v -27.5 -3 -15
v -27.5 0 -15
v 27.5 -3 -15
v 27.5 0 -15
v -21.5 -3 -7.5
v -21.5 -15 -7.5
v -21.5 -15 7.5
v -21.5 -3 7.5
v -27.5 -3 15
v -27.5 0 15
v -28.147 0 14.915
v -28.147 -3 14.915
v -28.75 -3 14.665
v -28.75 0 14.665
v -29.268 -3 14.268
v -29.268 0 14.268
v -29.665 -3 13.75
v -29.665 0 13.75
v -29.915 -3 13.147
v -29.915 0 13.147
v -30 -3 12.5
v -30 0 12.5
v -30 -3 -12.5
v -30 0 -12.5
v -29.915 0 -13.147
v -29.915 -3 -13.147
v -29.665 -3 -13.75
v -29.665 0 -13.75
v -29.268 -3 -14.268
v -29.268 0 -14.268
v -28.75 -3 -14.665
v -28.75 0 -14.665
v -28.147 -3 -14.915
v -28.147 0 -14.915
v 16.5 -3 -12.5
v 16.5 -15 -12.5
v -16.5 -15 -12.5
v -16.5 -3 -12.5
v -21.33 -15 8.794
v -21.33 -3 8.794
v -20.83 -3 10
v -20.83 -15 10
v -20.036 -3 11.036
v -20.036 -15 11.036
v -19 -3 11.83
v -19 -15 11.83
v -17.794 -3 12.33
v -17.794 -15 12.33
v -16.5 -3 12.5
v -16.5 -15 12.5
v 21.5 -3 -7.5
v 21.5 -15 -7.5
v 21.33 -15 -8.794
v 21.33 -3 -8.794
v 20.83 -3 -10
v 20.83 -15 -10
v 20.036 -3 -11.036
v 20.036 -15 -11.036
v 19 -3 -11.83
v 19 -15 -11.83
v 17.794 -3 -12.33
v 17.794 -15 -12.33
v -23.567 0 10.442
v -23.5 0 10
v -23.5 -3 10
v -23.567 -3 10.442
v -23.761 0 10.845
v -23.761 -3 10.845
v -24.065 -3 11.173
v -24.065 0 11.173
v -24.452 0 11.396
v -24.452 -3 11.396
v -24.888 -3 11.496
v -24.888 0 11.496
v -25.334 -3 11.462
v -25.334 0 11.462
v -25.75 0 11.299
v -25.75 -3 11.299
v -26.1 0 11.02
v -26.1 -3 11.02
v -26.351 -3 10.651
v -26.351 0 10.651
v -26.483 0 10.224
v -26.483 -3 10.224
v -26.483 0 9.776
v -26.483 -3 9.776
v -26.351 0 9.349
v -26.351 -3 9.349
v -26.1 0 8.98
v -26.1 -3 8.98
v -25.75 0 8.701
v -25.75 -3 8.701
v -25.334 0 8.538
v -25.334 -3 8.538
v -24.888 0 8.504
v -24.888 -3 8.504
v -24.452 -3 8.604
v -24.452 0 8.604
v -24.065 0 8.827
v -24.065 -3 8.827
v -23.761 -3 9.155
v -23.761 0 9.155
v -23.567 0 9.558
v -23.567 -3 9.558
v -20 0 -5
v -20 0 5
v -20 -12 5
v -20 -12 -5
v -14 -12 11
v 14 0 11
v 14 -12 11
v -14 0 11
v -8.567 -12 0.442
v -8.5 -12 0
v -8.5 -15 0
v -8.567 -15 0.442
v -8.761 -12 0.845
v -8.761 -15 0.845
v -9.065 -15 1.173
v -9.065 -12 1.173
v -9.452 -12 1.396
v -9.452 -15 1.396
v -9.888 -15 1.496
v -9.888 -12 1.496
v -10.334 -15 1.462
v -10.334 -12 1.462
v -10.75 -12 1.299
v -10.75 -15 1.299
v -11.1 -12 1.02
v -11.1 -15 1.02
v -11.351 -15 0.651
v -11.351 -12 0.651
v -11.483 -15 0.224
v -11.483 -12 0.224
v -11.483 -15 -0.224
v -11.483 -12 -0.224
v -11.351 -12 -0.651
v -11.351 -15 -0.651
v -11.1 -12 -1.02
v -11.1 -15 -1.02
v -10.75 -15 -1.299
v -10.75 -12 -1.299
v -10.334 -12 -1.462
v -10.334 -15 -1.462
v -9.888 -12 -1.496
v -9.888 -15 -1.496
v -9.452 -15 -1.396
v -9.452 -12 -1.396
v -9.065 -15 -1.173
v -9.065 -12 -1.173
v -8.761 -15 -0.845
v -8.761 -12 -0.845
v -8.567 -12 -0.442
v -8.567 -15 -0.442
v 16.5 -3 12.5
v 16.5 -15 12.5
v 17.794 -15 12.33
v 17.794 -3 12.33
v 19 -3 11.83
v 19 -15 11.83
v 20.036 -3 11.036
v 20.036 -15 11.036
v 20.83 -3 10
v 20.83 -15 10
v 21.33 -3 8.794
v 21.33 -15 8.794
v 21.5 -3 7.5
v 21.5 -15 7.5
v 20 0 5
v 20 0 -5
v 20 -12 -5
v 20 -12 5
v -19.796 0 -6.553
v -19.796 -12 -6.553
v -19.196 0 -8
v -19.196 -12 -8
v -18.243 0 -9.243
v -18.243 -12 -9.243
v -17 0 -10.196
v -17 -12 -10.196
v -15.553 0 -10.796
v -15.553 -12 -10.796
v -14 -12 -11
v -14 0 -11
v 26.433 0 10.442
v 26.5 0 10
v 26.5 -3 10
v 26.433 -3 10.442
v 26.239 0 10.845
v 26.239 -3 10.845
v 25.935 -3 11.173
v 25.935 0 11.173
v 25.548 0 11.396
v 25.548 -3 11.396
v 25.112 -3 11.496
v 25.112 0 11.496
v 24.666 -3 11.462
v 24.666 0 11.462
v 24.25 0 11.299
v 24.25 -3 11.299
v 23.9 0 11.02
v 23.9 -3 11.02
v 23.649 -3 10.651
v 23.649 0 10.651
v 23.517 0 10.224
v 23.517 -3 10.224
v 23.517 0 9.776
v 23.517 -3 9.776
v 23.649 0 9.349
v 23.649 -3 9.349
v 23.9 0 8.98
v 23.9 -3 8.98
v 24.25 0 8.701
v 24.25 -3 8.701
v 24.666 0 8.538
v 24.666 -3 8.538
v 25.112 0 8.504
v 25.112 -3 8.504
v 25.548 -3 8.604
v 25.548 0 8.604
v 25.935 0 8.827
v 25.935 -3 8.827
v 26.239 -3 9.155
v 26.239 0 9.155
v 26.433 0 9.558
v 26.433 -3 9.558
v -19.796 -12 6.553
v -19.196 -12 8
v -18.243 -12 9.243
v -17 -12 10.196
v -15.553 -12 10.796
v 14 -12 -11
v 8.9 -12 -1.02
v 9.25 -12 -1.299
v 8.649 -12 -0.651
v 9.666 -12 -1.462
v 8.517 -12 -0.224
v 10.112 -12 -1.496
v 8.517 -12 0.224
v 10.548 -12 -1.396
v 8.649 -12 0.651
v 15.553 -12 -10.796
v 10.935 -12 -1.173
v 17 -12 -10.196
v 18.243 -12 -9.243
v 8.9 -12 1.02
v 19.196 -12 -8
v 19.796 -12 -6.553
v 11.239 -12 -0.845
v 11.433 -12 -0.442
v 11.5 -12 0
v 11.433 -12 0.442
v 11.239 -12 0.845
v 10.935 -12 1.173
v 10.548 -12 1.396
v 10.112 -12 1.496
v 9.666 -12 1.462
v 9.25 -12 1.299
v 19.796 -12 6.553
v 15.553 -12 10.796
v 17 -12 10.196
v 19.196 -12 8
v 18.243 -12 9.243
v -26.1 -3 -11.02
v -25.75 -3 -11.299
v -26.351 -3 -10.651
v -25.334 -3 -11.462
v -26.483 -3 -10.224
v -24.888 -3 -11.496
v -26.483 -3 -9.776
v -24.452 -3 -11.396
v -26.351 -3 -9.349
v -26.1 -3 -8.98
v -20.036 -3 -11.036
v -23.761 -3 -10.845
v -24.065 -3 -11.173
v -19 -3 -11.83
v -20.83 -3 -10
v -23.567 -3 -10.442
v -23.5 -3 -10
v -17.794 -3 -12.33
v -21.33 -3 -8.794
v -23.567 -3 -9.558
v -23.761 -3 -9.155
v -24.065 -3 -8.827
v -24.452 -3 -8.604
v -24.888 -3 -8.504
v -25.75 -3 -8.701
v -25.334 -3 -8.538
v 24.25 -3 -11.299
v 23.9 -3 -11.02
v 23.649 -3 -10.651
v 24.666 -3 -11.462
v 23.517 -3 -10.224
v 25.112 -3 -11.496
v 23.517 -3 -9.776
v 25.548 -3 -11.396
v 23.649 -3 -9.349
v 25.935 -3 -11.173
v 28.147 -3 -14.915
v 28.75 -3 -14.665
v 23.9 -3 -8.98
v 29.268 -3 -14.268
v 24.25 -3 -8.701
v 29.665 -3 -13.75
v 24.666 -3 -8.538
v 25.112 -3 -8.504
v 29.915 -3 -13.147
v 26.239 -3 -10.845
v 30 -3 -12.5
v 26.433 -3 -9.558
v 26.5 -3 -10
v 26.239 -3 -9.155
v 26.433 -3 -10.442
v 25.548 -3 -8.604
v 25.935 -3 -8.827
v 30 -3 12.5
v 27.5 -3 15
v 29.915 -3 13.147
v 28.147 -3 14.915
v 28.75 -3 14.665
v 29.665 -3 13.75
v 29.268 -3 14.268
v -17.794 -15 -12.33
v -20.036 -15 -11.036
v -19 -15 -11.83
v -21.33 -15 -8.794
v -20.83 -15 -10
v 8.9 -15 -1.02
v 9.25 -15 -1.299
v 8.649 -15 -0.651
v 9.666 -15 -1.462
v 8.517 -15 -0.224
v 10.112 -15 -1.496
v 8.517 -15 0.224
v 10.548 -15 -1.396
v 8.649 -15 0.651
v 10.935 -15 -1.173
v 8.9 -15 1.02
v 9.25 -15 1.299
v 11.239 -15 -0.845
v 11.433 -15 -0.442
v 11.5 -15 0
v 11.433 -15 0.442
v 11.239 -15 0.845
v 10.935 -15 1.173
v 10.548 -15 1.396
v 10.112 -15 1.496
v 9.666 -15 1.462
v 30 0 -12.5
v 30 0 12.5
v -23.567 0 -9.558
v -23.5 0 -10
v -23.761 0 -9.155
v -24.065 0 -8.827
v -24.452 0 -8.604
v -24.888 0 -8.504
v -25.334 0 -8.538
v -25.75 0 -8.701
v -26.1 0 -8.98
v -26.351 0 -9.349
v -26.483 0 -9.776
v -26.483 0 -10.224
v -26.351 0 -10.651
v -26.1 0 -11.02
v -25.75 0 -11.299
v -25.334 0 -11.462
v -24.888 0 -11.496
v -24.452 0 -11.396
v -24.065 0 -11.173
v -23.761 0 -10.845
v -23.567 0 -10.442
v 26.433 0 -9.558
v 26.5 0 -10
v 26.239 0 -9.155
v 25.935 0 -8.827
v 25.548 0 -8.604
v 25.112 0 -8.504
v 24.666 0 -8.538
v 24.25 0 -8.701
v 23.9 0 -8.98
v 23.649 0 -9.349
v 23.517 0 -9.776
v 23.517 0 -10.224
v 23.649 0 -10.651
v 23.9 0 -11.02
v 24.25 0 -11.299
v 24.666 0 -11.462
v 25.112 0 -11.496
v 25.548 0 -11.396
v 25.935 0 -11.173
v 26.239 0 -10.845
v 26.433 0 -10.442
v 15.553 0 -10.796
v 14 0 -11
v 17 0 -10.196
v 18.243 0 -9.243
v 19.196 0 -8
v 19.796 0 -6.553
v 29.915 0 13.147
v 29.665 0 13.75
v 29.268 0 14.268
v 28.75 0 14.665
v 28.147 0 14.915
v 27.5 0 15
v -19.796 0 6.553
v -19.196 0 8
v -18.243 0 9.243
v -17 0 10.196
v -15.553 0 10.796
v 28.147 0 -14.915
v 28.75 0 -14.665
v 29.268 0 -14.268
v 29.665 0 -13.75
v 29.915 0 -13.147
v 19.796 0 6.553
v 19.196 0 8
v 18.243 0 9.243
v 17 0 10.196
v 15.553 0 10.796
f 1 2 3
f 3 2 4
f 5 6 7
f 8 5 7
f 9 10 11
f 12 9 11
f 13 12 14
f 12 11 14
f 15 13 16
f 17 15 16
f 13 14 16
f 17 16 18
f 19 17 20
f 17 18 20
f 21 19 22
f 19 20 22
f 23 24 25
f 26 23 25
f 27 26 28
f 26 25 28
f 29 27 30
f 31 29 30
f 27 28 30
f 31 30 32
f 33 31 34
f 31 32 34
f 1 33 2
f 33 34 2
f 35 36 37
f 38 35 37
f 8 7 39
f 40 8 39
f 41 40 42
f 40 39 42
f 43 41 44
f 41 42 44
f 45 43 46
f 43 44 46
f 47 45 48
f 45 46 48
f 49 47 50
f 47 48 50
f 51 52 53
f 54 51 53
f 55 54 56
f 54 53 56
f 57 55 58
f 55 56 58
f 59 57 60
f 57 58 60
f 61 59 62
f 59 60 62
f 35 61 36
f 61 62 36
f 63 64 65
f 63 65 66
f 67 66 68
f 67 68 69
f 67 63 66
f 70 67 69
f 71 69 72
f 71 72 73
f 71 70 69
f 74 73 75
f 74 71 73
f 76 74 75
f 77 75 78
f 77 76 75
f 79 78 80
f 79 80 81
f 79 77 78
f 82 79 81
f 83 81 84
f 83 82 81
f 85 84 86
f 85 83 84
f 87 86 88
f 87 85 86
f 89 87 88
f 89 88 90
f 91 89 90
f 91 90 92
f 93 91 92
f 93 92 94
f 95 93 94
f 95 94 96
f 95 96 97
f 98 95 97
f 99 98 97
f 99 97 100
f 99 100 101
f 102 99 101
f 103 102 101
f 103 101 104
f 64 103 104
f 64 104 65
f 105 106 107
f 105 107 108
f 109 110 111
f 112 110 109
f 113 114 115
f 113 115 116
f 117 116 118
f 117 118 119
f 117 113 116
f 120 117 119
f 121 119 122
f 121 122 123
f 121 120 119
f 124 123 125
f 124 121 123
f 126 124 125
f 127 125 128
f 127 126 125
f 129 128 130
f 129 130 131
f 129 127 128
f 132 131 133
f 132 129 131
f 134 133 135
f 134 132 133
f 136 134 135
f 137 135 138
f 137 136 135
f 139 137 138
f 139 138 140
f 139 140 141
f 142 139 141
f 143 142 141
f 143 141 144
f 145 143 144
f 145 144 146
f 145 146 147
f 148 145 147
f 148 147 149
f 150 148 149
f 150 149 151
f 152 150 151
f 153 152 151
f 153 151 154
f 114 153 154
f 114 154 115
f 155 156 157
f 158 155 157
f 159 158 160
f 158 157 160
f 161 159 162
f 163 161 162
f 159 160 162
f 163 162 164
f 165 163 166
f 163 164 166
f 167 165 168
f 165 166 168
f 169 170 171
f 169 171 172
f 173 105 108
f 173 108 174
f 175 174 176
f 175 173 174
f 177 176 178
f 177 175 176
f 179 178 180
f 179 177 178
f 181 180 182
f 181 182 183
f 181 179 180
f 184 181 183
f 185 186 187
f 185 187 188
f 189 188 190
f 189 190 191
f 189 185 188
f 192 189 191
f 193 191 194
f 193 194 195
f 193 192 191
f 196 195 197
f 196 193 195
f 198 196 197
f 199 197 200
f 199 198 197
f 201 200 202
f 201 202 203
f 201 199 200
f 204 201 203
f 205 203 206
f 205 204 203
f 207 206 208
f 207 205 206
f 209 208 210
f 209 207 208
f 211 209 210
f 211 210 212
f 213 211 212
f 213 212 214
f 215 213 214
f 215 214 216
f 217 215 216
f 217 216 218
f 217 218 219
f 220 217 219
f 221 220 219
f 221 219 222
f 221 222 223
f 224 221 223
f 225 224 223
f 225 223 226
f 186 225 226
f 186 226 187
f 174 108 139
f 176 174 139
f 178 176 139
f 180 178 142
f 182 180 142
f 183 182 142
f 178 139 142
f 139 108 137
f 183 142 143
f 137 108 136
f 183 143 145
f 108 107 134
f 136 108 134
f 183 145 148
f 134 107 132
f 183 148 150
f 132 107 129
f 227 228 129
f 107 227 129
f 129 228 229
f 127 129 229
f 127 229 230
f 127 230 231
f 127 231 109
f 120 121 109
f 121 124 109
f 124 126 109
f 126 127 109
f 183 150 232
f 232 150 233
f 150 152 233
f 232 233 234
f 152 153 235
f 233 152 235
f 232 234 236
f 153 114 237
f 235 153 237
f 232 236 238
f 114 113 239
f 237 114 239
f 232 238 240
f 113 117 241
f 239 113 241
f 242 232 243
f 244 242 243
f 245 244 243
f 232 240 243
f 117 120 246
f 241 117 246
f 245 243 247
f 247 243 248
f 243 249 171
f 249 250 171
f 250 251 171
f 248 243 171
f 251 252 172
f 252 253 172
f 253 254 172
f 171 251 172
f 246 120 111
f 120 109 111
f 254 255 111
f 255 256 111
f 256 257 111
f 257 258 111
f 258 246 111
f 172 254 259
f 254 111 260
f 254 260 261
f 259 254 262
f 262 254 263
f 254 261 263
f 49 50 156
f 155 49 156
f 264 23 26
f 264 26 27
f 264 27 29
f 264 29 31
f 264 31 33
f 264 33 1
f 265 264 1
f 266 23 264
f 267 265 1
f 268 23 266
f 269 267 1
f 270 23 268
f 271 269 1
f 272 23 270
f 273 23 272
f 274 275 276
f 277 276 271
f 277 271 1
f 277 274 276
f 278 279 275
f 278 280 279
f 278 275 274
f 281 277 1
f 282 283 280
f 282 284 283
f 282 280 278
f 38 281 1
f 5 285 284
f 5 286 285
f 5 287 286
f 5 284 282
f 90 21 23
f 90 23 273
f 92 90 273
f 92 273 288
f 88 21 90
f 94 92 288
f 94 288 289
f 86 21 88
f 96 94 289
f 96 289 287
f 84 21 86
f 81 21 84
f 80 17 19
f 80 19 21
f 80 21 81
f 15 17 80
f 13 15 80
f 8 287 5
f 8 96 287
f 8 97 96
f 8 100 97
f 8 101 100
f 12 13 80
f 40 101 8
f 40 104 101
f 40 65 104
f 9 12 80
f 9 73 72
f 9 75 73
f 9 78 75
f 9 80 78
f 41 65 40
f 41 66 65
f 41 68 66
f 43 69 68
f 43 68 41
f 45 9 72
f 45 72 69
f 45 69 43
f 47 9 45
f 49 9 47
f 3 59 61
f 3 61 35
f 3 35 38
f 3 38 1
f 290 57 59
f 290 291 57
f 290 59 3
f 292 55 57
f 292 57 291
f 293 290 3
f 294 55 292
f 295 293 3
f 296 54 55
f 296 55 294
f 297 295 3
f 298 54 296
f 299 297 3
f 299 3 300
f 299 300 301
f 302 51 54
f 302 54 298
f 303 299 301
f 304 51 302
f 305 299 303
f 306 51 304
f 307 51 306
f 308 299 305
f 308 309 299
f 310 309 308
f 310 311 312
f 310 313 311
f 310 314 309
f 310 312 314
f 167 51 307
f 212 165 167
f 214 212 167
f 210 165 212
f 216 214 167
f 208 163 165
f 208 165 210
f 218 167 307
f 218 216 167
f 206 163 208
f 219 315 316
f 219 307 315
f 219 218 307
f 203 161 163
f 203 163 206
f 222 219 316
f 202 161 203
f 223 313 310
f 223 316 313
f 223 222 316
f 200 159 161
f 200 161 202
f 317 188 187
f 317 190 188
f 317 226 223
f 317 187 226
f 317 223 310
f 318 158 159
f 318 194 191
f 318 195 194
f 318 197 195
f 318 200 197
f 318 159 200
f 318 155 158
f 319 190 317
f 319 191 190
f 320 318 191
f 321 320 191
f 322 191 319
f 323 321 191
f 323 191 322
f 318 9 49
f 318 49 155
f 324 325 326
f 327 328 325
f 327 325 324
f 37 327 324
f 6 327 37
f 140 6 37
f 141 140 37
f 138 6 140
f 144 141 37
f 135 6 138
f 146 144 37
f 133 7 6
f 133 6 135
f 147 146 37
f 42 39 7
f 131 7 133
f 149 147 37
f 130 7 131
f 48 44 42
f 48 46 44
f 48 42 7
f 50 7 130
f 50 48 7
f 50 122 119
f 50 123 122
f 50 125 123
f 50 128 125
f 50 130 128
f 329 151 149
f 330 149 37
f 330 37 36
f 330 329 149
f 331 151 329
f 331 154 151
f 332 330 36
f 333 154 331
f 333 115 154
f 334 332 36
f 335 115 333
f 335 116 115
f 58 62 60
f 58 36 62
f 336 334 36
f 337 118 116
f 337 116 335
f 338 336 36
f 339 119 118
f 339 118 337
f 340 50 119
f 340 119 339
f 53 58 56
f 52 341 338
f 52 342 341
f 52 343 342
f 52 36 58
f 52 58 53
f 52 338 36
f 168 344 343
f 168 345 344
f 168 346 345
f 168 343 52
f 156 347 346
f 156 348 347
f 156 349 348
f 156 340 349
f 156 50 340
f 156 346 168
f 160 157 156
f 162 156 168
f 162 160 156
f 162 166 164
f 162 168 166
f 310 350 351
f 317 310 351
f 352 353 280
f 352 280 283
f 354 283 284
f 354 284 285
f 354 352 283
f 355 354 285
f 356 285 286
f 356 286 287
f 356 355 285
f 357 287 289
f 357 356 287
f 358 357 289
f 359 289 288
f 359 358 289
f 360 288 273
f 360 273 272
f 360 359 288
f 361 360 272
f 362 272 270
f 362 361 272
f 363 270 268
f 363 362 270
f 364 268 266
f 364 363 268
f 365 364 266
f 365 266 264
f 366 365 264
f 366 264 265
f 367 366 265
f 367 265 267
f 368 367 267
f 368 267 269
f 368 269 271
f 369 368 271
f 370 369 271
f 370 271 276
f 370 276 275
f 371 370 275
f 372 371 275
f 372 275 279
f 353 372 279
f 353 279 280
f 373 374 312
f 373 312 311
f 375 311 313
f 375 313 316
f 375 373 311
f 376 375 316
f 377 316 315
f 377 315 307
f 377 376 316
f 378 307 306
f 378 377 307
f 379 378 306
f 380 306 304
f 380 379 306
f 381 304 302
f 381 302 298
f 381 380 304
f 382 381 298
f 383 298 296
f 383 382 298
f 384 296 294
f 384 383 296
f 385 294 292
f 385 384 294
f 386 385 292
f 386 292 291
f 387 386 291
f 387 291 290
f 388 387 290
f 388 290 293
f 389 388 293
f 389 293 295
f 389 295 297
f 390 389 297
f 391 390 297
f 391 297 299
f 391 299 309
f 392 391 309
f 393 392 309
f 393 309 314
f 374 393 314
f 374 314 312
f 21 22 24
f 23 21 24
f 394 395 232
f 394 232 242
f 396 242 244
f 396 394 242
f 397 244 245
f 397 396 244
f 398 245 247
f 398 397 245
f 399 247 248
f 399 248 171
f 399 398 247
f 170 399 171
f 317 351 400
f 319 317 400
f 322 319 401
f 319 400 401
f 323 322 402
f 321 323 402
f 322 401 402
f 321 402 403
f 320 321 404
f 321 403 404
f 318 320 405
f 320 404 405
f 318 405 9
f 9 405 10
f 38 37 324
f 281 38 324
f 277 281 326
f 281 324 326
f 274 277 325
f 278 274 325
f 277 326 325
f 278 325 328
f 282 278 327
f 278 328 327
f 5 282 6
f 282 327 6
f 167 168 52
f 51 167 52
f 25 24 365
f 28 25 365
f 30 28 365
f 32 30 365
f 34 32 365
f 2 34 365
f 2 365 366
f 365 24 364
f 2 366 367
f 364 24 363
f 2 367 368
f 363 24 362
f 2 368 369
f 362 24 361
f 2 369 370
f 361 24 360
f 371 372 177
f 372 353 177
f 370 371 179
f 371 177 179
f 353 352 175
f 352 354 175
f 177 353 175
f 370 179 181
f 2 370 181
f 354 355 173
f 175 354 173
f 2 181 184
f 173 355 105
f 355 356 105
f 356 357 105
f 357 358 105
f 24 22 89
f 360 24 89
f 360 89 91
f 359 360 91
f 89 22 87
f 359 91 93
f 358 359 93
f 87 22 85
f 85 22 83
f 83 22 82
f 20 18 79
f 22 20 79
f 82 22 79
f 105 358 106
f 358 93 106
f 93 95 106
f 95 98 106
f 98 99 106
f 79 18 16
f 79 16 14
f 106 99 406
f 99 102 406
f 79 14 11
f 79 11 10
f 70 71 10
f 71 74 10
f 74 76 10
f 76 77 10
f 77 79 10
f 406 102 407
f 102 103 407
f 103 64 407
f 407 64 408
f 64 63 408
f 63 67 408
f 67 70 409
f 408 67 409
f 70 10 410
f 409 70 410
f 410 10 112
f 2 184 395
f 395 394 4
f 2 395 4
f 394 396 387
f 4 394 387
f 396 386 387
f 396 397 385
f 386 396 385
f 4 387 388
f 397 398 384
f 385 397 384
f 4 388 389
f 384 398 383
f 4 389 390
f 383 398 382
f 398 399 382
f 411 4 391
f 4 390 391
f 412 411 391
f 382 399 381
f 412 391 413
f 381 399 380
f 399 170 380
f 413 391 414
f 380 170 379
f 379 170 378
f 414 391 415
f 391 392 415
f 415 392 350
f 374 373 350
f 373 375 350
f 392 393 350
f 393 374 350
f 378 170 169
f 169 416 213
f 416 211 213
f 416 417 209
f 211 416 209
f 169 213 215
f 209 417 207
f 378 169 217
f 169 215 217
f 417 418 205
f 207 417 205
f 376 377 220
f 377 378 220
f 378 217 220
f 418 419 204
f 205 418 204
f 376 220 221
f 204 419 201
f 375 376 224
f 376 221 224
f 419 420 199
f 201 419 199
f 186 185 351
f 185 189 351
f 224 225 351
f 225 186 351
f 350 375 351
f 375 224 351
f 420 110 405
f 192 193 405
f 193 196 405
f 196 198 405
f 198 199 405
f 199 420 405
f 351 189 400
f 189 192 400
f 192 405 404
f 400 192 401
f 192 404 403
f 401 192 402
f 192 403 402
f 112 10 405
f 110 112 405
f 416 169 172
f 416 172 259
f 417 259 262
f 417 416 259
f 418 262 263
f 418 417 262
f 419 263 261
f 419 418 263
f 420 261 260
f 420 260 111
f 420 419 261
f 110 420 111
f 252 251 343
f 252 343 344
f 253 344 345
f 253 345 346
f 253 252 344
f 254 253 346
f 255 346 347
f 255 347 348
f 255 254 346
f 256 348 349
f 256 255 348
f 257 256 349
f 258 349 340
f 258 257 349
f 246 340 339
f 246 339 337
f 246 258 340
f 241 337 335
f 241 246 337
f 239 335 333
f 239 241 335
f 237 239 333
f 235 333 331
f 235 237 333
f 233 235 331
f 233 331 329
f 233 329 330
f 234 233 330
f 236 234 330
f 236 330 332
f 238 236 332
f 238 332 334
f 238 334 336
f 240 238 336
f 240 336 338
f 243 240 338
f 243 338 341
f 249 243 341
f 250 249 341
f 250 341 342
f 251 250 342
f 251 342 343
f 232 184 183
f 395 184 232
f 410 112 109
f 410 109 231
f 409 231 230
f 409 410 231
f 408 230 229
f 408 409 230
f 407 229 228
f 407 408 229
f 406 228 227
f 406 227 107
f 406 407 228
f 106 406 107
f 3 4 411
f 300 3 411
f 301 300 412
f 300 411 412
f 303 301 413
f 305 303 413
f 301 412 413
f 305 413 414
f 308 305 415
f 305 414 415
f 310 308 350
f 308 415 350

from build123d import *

# Parameters (mm, degrees)
F0_R     = 1.5
F1_DEPTH = 15
F2_DEPTH = 12
F3_R     = 1.5
F4_DEPTH = 12


with BuildPart() as f1:
    # F0 (on Front) → F1 (new body)
    with BuildSketch(Plane.XZ):
        with BuildLine():
            Line((0, 11), (0, 15))
            Line((0, 15), (-27.5, 15))
            ThreePointArc((-27.5, 15), (-29.267767, 14.267767), (-30, 12.5))
            Line((-30, 12.5), (-30, -12.5))
            ThreePointArc((-30, -12.5), (-29.267767, -14.267767), (-27.5, -15))
            Line((-27.5, -15), (0, -15))
            Line((0, -15), (0, -11))
            Line((0, -11), (-14, -11))
            ThreePointArc((-14, -11), (-18.242641, -9.242641), (-20, -5))
            Line((-20, -5), (-20, 5))
            ThreePointArc((-20, 5), (-18.242641, 9.242641), (-14, 11))
            Line((-14, 11), (0, 11))
        make_face()
        with Locations((-25, -10)):
            Circle(F0_R, mode=Mode.SUBTRACT)
        with Locations((-25, 10)):
            Circle(F0_R, mode=Mode.SUBTRACT)
        with BuildLine():
            Line((0, -11), (0, 11))
            Line((0, 11), (-14, 11))
            ThreePointArc((-14, 11), (-18.242641, 9.242641), (-20, 5))
            Line((-20, 5), (-20, -5))
            ThreePointArc((-20, -5), (-18.242641, -9.242641), (-14, -11))
            Line((-14, -11), (0, -11))
        make_face()
        with Locations((-10, 0)):
            Circle(F0_R, mode=Mode.SUBTRACT)
        with BuildLine():
            Line((14, 11), (0, 11))
            Line((0, 11), (0, -11))
            Line((0, -11), (14, -11))
            ThreePointArc((14, -11), (18.242641, -9.242641), (20, -5))
            Line((20, -5), (20, 5))
            ThreePointArc((20, 5), (18.242641, 9.242641), (14, 11))
        make_face()
        with Locations((10, 0)):
            Circle(F0_R, mode=Mode.SUBTRACT)
        with BuildLine():
            Line((27.5, 15), (0, 15))
            Line((0, 15), (0, 11))
            Line((0, 11), (14, 11))
            ThreePointArc((14, 11), (18.242641, 9.242641), (20, 5))
            Line((20, 5), (20, -5))
            ThreePointArc((20, -5), (18.242641, -9.242641), (14, -11))
            Line((14, -11), (0, -11))
            Line((0, -11), (0, -15))
            Line((0, -15), (27.5, -15))
            ThreePointArc((27.5, -15), (29.267767, -14.267767), (30, -12.5))
            Line((30, -12.5), (30, 12.5))
            ThreePointArc((30, 12.5), (29.267767, 14.267767), (27.5, 15))
        make_face()
        with Locations((25, -10)):
            Circle(F0_R, mode=Mode.SUBTRACT)
        with Locations((25, 10)):
            Circle(F0_R, mode=Mode.SUBTRACT)
    extrude(amount=F1_DEPTH)

    # F0 (on Front) → F2 (cut)
    with BuildSketch(Plane.XZ):
        with BuildLine():
            Line((0, -11), (0, 11))
            Line((0, 11), (-14, 11))
            ThreePointArc((-14, 11), (-18.242641, 9.242641), (-20, 5))
            Line((-20, 5), (-20, -5))
            ThreePointArc((-20, -5), (-18.242641, -9.242641), (-14, -11))
            Line((-14, -11), (0, -11))
        make_face()
        with Locations((-10, 0)):
            Circle(F0_R, mode=Mode.SUBTRACT)
        with BuildLine():
            Line((14, 11), (0, 11))
            Line((0, 11), (0, -11))
            Line((0, -11), (14, -11))
            ThreePointArc((14, -11), (18.242641, -9.242641), (20, -5))
            Line((20, -5), (20, 5))
            ThreePointArc((20, 5), (18.242641, 9.242641), (14, 11))
        make_face()
        with Locations((10, 0)):
            Circle(F0_R, mode=Mode.SUBTRACT)
    extrude(amount=F2_DEPTH, mode=Mode.SUBTRACT)

    # F3 (on face) → F4 (cut)
    with BuildSketch(Plane.XZ.offset(15)):
        with BuildLine():
            ThreePointArc((30, 12.5), (29.267767, 14.267767), (27.5, 15))
            Line((27.5, 15), (-27.5, 15))
            ThreePointArc((-27.5, 15), (-29.267767, 14.267767), (-30, 12.5))
            Line((-30, 12.5), (-30, -12.5))
            ThreePointArc((-30, -12.5), (-29.267767, -14.267767), (-27.5, -15))
            Line((-27.5, -15), (27.5, -15))
            ThreePointArc((27.5, -15), (29.267767, -14.267767), (30, -12.5))
            Line((30, -12.5), (30, 12.5))
        make_face()
        with Locations((-25, -10)):
            Circle(F3_R, mode=Mode.SUBTRACT)
        with Locations((25, -10)):
            Circle(F3_R, mode=Mode.SUBTRACT)
        with BuildLine():
            ThreePointArc((-21.5, 7.5), (-20.035534, 11.035534), (-16.5, 12.5))
            Line((-16.5, 12.5), (16.5, 12.5))
            ThreePointArc((16.5, 12.5), (20.035534, 11.035534), (21.5, 7.5))
            Line((21.5, 7.5), (21.5, -7.5))
            ThreePointArc((21.5, -7.5), (20.035534, -11.035534), (16.5, -12.5))
            Line((16.5, -12.5), (-16.5, -12.5))
            ThreePointArc((-16.5, -12.5), (-20.035534, -11.035534), (-21.5, -7.5))
            Line((-21.5, -7.5), (-21.5, 7.5))
        make_face(mode=Mode.SUBTRACT)
        with Locations((-25, 10)):
            Circle(F3_R, mode=Mode.SUBTRACT)
        with Locations((25, 10)):
            Circle(F3_R, mode=Mode.SUBTRACT)
    extrude(amount=-F4_DEPTH, mode=Mode.SUBTRACT)


solid = f1.part
